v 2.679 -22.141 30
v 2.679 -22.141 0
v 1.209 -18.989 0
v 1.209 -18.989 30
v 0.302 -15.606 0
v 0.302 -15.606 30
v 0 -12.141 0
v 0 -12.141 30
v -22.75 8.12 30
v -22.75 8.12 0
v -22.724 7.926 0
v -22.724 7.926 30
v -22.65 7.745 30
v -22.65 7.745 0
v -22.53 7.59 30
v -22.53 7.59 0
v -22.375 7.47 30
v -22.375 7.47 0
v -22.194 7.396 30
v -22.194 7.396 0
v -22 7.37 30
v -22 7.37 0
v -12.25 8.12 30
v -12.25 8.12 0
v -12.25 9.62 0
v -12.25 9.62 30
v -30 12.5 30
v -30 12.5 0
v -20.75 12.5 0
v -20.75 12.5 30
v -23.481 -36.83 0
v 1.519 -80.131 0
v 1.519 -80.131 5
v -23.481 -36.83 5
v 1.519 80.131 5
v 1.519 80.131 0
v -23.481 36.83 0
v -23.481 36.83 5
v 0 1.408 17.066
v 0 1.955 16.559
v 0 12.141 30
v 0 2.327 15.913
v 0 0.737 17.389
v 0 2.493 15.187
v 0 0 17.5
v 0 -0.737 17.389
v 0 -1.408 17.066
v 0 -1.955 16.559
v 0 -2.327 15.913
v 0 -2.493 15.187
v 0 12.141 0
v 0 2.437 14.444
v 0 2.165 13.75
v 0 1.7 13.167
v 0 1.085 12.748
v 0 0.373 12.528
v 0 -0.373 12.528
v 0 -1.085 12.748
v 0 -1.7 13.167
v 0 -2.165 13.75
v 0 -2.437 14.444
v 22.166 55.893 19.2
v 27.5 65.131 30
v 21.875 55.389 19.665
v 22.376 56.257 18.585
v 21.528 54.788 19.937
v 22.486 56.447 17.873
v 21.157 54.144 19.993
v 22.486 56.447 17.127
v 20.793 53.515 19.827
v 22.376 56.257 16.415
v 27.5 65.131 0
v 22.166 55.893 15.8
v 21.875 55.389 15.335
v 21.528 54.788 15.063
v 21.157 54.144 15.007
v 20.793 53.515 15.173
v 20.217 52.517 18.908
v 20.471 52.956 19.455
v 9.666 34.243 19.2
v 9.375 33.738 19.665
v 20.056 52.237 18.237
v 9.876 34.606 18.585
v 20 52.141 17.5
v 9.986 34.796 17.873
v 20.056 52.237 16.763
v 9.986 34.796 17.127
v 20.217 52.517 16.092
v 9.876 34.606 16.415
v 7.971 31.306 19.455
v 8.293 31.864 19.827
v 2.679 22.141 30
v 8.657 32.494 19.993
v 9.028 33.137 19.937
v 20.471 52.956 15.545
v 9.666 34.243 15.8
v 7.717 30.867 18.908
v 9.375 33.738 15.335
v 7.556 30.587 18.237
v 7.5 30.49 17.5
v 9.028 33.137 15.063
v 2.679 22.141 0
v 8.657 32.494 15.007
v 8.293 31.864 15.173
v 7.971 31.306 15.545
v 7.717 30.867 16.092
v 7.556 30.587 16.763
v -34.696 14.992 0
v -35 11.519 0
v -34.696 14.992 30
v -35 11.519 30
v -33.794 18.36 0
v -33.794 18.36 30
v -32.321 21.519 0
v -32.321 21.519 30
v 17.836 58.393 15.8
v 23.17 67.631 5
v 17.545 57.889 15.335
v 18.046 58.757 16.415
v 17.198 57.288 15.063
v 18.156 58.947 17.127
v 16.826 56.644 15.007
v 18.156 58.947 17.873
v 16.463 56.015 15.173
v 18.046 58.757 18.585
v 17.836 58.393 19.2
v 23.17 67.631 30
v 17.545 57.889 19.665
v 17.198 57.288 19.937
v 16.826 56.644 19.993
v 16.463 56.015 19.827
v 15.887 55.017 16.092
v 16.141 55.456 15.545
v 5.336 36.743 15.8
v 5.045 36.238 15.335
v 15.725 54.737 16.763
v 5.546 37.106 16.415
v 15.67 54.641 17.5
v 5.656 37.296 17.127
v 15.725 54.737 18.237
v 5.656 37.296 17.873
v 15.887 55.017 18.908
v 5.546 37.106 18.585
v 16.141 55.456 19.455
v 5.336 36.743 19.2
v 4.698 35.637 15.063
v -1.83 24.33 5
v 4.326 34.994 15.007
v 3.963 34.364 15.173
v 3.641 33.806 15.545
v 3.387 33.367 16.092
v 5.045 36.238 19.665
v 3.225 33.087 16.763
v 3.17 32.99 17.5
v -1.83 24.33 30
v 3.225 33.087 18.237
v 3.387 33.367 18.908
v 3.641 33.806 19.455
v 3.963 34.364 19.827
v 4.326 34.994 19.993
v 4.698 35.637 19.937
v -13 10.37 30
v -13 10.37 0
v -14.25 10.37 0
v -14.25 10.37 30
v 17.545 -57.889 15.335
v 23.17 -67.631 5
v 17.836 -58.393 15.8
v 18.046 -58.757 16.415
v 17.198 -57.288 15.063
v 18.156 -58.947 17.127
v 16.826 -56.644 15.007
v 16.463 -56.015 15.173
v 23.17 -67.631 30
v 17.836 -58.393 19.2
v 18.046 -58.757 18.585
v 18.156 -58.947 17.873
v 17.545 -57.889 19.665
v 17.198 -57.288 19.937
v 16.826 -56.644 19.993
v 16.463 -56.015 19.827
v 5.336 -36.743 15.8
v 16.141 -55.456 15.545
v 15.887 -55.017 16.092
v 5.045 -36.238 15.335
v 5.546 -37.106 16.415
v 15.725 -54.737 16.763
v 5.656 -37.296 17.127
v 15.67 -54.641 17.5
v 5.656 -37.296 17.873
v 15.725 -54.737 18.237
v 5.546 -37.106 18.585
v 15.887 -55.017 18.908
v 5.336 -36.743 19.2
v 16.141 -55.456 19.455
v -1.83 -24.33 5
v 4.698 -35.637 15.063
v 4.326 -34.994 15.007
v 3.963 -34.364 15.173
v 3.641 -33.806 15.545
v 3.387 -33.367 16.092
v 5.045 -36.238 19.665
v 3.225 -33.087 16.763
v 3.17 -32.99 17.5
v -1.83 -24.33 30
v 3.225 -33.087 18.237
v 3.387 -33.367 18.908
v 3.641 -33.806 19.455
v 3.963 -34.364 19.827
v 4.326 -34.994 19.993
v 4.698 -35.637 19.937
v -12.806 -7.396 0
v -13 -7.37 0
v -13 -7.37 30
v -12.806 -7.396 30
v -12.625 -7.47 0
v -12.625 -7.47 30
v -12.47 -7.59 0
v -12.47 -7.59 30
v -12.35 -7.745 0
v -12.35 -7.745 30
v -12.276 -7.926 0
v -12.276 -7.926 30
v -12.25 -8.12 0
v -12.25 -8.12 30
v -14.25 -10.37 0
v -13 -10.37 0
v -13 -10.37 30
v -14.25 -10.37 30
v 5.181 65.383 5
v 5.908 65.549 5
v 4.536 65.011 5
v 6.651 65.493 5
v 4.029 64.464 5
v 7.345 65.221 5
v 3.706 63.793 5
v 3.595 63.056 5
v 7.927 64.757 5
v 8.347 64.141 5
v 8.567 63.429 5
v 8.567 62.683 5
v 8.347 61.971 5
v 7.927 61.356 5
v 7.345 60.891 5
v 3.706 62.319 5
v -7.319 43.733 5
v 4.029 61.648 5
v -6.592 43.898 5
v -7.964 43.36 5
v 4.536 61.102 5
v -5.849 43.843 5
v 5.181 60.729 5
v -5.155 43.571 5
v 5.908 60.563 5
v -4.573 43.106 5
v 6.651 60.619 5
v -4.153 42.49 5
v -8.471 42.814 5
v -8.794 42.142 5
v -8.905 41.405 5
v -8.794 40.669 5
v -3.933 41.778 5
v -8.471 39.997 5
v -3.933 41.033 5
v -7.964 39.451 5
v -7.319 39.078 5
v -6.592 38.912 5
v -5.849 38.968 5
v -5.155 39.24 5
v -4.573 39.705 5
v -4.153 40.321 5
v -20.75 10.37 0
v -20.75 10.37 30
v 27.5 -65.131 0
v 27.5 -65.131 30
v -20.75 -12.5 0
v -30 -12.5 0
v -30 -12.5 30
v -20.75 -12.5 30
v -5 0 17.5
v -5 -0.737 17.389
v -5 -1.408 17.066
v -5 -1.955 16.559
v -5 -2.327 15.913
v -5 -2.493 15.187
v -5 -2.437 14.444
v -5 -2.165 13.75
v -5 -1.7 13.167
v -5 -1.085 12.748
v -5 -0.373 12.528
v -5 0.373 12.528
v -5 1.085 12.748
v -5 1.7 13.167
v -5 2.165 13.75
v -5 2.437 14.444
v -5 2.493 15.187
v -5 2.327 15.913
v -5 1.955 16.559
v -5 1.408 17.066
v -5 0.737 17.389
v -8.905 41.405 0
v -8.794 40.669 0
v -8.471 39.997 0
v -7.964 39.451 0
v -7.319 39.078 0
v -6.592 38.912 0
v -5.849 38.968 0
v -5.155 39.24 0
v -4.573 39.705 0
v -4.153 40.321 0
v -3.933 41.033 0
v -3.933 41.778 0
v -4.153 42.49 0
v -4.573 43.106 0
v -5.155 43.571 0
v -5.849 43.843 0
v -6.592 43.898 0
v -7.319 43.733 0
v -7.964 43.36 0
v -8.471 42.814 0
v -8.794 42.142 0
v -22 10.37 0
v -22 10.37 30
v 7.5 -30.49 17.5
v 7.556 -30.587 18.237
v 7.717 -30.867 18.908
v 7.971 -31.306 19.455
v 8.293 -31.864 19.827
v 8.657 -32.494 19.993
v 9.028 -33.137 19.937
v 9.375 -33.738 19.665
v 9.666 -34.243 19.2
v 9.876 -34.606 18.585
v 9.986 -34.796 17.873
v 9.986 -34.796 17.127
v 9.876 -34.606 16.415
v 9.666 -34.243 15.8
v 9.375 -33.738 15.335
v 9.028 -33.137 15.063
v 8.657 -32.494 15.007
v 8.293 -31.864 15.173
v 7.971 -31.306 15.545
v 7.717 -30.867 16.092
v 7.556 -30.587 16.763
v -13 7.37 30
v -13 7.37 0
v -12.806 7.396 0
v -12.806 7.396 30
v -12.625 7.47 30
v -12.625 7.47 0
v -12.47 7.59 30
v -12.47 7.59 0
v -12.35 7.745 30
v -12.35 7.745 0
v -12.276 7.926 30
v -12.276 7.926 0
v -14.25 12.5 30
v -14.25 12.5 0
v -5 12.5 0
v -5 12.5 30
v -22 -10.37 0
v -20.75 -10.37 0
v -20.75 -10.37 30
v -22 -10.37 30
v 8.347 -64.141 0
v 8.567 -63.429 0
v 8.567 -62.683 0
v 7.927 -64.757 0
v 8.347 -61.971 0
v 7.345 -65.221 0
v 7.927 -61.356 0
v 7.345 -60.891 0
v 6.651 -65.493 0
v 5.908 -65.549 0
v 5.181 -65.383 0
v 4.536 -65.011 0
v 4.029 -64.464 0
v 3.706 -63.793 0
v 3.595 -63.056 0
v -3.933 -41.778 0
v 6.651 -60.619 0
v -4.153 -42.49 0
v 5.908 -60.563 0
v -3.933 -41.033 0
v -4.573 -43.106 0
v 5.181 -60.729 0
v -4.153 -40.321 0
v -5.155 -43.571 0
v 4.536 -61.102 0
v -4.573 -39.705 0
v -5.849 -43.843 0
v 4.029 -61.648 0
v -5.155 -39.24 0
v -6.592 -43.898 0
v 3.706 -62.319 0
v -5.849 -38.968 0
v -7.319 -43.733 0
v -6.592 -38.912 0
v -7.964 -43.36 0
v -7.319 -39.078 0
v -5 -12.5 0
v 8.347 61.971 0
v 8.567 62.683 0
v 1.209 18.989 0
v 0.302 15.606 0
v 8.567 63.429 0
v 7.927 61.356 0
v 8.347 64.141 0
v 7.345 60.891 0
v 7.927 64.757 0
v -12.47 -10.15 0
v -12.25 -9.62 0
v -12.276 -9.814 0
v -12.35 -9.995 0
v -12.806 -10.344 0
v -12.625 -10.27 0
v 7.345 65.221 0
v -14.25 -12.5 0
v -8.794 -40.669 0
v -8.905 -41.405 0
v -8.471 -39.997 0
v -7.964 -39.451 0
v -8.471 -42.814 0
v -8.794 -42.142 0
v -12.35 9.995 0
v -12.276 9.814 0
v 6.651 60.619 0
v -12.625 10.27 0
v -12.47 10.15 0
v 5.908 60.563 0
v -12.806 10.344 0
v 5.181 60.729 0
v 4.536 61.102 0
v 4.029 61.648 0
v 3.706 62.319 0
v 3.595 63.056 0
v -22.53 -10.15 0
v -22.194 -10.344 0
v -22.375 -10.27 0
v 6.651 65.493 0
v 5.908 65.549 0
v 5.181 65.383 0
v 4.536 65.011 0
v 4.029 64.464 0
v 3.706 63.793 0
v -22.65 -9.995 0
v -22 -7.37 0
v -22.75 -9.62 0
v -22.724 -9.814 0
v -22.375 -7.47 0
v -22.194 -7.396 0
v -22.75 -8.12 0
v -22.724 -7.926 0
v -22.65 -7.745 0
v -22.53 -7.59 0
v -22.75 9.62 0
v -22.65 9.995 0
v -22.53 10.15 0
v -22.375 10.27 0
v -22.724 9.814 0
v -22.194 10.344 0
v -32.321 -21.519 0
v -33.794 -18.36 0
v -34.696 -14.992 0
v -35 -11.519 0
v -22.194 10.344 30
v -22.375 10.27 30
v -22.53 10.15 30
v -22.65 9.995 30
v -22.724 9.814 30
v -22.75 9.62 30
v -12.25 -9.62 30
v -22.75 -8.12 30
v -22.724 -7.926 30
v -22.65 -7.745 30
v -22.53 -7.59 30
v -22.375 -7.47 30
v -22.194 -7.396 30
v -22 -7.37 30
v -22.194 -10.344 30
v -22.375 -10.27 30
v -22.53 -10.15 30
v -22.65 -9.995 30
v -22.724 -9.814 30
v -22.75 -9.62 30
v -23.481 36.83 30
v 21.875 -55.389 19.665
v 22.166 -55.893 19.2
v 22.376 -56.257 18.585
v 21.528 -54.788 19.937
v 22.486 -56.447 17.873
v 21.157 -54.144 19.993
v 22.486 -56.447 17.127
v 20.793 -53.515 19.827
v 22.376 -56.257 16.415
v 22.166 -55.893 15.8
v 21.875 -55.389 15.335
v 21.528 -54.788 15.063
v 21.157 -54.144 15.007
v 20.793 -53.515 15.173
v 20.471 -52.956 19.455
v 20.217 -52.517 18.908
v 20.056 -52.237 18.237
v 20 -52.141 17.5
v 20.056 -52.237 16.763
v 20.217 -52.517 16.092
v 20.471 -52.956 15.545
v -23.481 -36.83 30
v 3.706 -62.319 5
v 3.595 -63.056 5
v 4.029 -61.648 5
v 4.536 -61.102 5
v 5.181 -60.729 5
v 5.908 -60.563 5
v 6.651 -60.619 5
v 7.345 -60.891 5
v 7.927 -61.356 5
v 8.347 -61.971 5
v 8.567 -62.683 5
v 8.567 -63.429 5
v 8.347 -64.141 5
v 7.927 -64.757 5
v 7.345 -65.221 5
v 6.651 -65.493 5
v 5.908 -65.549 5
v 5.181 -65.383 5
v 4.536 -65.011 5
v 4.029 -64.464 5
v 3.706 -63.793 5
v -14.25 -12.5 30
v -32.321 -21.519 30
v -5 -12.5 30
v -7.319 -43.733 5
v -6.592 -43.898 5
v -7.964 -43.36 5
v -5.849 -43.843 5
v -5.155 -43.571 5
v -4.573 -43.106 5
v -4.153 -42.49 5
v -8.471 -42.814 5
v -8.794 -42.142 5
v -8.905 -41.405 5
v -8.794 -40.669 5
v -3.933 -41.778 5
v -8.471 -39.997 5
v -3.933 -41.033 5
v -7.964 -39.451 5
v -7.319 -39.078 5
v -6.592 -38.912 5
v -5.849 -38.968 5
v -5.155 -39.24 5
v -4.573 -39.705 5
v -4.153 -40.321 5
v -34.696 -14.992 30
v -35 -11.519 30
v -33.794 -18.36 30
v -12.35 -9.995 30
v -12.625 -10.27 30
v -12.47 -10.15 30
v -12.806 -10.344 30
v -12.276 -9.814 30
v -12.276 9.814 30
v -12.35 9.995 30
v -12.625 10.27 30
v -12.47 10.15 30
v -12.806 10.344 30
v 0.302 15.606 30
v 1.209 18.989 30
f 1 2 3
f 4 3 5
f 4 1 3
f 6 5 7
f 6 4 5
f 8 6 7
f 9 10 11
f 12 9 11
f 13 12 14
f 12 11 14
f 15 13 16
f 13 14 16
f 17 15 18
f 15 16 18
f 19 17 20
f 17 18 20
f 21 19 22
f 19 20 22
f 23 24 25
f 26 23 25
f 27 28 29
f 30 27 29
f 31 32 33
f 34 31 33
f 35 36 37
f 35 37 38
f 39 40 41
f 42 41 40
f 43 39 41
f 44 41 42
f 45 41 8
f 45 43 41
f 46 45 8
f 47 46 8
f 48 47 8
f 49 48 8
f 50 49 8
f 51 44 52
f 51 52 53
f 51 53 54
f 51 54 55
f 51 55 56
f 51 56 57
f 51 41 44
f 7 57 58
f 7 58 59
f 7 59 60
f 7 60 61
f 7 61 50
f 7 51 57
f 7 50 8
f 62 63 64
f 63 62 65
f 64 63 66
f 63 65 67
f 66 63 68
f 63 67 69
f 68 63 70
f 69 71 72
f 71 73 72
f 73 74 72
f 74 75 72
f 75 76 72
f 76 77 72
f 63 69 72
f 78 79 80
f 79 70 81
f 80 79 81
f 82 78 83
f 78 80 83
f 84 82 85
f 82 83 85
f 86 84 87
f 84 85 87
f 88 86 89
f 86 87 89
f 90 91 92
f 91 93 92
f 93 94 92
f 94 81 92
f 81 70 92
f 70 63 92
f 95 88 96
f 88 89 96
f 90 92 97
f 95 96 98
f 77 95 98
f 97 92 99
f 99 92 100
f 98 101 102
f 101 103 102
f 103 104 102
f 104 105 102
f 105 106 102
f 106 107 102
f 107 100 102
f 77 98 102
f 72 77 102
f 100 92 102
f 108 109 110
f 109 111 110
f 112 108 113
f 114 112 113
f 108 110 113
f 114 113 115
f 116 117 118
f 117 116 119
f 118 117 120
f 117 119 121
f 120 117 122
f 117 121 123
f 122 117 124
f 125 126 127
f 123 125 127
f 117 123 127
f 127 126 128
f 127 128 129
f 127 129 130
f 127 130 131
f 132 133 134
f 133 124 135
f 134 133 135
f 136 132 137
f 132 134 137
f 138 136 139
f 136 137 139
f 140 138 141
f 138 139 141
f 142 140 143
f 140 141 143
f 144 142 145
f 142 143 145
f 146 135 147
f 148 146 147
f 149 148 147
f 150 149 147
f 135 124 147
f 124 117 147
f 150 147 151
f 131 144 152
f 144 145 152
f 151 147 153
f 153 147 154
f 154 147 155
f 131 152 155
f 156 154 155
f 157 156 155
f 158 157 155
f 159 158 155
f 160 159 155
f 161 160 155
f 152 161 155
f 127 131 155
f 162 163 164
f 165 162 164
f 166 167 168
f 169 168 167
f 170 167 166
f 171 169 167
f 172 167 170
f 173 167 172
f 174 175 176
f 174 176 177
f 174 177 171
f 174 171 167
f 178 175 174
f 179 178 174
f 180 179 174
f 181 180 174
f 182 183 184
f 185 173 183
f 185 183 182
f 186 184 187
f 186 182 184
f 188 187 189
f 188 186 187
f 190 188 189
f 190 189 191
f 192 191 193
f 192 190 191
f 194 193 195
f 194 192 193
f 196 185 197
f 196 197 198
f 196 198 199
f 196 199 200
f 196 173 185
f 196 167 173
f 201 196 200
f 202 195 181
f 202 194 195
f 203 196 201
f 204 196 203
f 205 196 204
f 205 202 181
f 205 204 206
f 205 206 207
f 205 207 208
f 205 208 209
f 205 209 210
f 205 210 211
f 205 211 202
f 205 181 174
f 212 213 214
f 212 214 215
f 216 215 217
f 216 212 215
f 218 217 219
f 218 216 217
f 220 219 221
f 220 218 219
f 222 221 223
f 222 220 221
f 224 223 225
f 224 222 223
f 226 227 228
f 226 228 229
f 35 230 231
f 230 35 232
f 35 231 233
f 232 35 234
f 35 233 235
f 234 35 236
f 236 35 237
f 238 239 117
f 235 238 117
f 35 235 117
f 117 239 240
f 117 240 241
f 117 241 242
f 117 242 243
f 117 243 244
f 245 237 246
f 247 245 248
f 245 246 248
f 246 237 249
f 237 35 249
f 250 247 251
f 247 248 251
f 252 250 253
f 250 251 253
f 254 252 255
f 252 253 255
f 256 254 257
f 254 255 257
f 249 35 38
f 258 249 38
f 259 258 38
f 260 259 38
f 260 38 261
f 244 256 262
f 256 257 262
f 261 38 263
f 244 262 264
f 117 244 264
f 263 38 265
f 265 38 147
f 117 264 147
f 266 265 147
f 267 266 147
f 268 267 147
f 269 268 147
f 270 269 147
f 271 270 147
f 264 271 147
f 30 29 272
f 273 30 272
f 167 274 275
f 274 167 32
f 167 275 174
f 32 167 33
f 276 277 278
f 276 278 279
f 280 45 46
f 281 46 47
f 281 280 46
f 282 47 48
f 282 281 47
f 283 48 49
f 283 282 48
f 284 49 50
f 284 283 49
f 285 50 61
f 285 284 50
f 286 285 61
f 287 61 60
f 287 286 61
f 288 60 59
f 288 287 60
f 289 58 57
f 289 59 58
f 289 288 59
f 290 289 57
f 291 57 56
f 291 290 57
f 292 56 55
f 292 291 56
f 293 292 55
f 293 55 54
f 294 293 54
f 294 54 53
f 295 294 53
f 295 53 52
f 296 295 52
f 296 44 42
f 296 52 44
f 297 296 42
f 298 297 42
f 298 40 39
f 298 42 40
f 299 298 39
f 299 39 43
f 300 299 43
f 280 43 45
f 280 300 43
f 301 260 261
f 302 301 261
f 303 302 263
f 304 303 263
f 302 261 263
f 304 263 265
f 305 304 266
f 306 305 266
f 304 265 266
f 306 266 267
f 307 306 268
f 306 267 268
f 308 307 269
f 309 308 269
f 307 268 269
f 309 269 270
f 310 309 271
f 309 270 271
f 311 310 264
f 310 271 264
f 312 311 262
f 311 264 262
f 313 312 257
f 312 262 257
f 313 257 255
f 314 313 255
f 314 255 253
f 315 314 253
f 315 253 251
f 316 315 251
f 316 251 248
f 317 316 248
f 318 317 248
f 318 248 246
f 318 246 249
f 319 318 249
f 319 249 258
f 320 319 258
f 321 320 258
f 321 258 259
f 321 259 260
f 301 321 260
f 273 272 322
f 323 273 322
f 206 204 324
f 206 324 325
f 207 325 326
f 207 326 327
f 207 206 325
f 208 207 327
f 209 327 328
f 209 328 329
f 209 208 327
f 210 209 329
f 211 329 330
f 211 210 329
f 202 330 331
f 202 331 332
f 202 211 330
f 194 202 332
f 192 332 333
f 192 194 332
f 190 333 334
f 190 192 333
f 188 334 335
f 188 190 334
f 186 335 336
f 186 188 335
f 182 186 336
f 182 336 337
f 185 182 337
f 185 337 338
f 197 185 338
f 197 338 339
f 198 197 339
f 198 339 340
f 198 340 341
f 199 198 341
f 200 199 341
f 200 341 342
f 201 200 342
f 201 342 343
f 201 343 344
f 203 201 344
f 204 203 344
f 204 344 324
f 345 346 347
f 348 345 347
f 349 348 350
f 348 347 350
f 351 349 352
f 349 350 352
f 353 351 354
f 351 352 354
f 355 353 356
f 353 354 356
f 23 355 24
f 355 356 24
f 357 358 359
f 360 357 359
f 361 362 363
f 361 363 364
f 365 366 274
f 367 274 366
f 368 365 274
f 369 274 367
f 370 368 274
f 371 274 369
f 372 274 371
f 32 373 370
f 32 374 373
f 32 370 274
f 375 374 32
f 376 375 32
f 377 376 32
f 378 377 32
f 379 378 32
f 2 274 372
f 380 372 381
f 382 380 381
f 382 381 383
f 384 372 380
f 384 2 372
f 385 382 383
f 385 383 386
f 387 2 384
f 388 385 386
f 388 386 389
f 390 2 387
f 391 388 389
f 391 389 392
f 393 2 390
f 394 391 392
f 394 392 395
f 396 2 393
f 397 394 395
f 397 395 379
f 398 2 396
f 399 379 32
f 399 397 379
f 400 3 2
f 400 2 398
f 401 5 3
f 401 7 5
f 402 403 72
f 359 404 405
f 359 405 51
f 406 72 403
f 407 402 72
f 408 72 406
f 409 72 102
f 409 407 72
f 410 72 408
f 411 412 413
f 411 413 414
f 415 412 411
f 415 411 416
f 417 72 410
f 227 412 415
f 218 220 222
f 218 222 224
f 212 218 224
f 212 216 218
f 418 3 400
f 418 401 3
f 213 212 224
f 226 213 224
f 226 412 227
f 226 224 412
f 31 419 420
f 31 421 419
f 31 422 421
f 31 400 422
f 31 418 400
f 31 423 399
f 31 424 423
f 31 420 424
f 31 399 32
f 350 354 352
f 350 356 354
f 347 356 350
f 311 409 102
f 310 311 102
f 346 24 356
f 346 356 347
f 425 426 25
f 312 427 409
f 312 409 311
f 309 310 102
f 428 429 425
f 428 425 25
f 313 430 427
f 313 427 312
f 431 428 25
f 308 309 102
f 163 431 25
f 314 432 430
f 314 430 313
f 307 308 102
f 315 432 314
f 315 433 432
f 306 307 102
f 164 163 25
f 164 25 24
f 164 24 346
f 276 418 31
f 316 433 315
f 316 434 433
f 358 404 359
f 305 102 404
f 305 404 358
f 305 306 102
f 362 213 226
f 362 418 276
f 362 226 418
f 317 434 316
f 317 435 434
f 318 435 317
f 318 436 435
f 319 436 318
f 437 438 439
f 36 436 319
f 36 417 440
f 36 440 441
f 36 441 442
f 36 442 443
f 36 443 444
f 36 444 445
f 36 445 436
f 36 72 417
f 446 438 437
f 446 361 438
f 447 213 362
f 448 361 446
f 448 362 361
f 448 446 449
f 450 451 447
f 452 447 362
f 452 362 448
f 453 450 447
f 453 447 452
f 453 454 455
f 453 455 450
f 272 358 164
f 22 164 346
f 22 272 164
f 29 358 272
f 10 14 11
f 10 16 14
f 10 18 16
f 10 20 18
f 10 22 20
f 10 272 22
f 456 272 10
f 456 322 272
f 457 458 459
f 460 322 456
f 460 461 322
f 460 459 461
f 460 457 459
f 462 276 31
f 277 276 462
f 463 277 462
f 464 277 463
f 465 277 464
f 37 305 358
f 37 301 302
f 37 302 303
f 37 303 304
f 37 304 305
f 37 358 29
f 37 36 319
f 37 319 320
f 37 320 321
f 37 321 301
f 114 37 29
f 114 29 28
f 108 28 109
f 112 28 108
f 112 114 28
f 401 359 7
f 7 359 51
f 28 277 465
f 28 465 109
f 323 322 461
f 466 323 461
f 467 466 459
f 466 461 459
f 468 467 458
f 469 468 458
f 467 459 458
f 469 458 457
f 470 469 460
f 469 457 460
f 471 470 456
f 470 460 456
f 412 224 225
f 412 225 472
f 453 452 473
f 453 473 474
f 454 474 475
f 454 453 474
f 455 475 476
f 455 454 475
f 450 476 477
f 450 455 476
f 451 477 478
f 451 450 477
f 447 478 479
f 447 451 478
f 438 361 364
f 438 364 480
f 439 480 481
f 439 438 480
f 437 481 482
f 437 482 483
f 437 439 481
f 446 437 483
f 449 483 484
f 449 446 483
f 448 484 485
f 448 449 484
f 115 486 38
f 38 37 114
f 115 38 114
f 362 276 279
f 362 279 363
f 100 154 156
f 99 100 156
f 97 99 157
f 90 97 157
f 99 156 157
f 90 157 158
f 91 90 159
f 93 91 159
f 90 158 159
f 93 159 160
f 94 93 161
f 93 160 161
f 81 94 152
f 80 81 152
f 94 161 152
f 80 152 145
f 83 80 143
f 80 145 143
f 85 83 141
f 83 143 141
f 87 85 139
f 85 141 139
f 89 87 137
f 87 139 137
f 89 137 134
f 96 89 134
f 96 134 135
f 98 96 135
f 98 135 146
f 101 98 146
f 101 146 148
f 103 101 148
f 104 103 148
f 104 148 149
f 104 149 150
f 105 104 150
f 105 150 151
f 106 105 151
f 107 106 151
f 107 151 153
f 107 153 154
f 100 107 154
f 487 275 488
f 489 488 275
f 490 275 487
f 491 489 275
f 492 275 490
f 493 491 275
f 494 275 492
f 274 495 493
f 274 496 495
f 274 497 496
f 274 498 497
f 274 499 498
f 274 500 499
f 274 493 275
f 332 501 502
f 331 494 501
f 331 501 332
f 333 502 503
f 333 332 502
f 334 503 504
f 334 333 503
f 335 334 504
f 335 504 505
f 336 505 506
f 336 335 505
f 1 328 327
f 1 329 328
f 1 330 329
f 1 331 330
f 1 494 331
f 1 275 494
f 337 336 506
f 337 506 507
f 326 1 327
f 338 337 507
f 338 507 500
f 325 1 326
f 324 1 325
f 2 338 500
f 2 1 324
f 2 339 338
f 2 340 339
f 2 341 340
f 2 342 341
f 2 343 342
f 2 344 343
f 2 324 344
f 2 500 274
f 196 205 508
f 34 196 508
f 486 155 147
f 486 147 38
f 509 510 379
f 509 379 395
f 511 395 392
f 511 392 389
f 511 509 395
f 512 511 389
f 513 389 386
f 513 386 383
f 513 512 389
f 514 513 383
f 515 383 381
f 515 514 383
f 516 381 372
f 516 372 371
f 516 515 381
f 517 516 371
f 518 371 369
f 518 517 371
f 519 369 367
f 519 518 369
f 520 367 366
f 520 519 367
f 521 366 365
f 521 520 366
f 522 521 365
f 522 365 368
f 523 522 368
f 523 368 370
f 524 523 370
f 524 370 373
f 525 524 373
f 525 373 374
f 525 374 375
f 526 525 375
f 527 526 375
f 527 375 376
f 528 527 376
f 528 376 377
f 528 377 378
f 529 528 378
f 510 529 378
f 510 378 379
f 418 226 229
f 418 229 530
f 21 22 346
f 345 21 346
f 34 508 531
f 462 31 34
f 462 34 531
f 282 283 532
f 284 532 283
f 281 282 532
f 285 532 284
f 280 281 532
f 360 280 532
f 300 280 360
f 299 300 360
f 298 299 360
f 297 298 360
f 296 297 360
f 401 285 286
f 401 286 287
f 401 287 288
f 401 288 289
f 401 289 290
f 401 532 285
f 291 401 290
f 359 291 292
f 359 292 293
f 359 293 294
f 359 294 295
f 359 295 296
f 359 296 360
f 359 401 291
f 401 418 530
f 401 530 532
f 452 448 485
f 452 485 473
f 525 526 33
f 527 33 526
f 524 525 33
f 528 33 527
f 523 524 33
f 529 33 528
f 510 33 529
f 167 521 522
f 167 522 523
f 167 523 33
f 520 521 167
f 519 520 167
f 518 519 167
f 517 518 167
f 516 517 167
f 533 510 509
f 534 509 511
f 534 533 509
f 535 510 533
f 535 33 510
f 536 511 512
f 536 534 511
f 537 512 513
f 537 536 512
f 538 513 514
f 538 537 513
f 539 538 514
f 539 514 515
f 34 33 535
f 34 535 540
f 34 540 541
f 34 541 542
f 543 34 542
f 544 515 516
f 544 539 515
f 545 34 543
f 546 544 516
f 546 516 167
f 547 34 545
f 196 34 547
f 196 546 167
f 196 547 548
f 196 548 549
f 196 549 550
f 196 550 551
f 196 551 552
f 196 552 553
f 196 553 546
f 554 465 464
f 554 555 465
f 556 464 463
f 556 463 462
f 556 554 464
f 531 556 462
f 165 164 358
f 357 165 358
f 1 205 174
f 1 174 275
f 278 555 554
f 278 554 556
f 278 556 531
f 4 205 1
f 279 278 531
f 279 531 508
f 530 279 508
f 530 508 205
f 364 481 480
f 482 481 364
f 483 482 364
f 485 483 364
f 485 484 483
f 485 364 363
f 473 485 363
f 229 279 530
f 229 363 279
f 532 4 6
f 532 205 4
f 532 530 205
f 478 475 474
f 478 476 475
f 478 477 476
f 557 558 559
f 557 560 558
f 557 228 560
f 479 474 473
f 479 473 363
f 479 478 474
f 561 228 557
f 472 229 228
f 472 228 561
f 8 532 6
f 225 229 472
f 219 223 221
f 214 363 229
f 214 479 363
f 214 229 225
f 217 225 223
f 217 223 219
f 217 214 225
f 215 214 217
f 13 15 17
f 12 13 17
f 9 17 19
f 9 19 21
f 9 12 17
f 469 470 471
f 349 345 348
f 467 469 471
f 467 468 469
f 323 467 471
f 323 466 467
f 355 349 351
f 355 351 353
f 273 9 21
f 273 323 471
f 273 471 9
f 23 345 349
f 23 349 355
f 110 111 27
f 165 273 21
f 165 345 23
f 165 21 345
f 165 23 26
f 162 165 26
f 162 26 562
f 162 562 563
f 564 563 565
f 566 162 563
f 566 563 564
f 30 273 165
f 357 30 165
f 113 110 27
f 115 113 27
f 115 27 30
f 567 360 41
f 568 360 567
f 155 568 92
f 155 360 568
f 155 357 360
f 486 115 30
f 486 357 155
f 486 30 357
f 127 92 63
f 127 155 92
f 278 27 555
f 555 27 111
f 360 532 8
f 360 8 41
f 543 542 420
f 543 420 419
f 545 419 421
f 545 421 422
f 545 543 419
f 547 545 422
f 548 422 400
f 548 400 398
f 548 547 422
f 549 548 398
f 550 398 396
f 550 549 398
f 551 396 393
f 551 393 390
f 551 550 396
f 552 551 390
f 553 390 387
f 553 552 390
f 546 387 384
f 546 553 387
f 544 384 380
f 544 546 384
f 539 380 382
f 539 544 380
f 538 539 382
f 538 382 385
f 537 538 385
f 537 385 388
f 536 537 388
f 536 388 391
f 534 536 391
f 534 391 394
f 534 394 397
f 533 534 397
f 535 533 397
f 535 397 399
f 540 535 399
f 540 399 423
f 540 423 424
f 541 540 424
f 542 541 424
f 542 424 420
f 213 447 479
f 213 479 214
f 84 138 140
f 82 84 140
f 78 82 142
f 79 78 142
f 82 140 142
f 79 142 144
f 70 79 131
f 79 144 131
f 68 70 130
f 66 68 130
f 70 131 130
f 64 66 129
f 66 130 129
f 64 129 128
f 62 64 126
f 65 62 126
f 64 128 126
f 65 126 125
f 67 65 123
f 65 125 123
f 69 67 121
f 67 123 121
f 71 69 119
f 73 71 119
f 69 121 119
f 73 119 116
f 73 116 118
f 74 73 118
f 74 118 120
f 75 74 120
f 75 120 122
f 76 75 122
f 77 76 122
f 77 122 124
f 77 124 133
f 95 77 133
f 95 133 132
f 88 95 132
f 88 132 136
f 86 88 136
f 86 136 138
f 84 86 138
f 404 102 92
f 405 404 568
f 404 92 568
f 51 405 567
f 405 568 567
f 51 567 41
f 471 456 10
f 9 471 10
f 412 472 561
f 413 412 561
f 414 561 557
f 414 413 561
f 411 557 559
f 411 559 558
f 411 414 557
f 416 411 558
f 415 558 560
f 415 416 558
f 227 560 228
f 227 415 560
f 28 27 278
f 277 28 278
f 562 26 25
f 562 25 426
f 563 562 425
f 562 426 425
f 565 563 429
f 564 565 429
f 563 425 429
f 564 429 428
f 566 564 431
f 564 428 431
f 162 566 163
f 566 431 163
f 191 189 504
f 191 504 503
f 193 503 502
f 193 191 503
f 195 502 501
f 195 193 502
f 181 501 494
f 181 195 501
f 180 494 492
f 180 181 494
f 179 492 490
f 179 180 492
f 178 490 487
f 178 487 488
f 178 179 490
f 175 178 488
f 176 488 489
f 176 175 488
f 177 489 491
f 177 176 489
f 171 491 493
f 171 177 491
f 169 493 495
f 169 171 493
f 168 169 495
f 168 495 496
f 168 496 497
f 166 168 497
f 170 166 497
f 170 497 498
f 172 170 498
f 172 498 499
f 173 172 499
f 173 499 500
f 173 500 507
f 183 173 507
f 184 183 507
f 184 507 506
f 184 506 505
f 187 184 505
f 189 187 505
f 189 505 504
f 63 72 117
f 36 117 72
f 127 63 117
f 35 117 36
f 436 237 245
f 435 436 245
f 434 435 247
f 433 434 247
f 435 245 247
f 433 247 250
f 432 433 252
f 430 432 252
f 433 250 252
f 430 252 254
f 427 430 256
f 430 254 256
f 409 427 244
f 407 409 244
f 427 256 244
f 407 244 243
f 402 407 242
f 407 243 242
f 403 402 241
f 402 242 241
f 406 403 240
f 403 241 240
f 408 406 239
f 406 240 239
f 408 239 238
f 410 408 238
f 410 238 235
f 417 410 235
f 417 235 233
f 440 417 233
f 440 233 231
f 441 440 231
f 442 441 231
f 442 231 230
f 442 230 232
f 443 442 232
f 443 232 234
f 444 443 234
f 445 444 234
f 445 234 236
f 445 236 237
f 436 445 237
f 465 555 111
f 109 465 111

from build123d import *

# Parameters (mm, degrees)
F1_DEPTH       = 30
F3_DEPTH       = 50
F7_D           = 5
F7_DEPTH       = 12.7
F7_TIP         = 1.5021515476
F7_ON_F4_D     = 5
F7_ON_F4_DEPTH = 12.7
F7_ON_F4_TIP   = 1.5021515476
F7_ON_F6_D     = 5
F7_ON_F6_DEPTH = 12.7
F7_ON_F6_TIP   = 1.5021515476
F8_R           = 20


with BuildPart() as f1:
    # F0 (on Top) → F1 (new body)
    with BuildSketch(Plane.XY):
        with BuildLine():
            Line((-35, 16.8782217351), (-35, 0))
            Line((-35, 0), (-30, 0))
            Line((-30, 0), (-30, 12.5))
            Line((-30, 12.5), (-20.75, 12.5))
            Line((-20.75, 12.5), (-20.75, 10.37))
            Line((-20.75, 10.37), (-22, 10.37))
            ThreePointArc((-22, 10.37), (-22.5303300859, 10.1503300859), (-22.75, 9.62))
            Line((-22.75, 9.62), (-22.75, 8.12))
            ThreePointArc((-22.75, 8.12), (-22.5303300859, 7.5896699141), (-22, 7.37))
            Line((-22, 7.37), (-13, 7.37))
            ThreePointArc((-13, 7.37), (-12.4696699141, 7.5896699141), (-12.25, 8.12))
            Line((-12.25, 8.12), (-12.25, 9.62))
            ThreePointArc((-12.25, 9.62), (-12.4696699141, 10.1503300859), (-13, 10.37))
            Line((-13, 10.37), (-14.25, 10.37))
            Line((-14.25, 10.37), (-14.25, 12.5))
            Line((-14.25, 12.5), (-5, 12.5))
            Line((-5, 12.5), (-5, 0))
            Line((-5, 0), (0, 0))
            Line((0, 0), (0, 17.5))
            Line((0, 17.5), (2.5, 21.8301270189))
            Line((2.5, 21.8301270189), (-23.4807621135, 36.8301270189))
            Line((-23.4807621135, 36.8301270189), (-35, 16.8782217351))
        make_face()
    extrude(amount=F1_DEPTH)

    # F2 (on face) → F3 (join)
    with BuildSketch(Plane(origin=(10.0777222831, 17.4551270189, 0), x_dir=(-0.8660254038, 0.5, 0), z_dir=(0.5, 0.8660254038, 0))):
        Polygon((13.75, 30), (8.75, 30), (8.75, 0), (38.75, 0), (38.75, 5), (13.75, 5), align=None)
    extrude(amount=F3_DEPTH)

    # F7
    with Locations(Plane.YZ):
        with Locations((0, 15)):
            Hole(F7_D / 2, depth=F7_DEPTH)
            with Locations((0, 0, -(F7_DEPTH + F7_TIP / 2))):  # 118° drill point
                Cone(0, F7_D / 2, F7_TIP, mode=Mode.SUBTRACT)

    # F7 on F4
    with Locations(Plane(origin=(0, 0, 0), x_dir=(1, 0, 0), z_dir=(0, 0, -1))):
        with Locations((-6.4054445662, -41.4054445662), (6.0945554338, -63.0560796608)):
            Hole(F7_ON_F4_D / 2, depth=F7_ON_F4_DEPTH)
            with Locations((0, 0, -(F7_ON_F4_DEPTH + F7_ON_F4_TIP / 2))):  # 118° drill point
                Cone(0, F7_ON_F4_D / 2, F7_ON_F4_TIP, mode=Mode.SUBTRACT)

    # F7 on F6
    with Locations(Plane(origin=(-7.5777222831, 4.375, 0), x_dir=(0.5, 0.8660254038, 0), z_dir=(0.8660254038, -0.5, 0))):
        with Locations((32.6554445662, 17.5), (57.6554445662, 17.5)):
            Hole(F7_ON_F6_D / 2, depth=F7_ON_F6_DEPTH)
            with Locations((0, 0, -(F7_ON_F6_DEPTH + F7_ON_F6_TIP / 2))):  # 118° drill point
                Cone(0, F7_ON_F6_D / 2, F7_ON_F6_TIP, mode=Mode.SUBTRACT)

    # F8
    f8_edges = [f1.edges().sort_by_distance(p)[0] for p in [
        (-35, 16.878222, 15),
        (0, 17.5, 15),
    ]]
    fillet(f8_edges, radius=F8_R)

    # F9: F1 across plane


with BuildPart() as f1_1:
    add(f1.part)
    add(f1.part.mirror(Plane.XZ))


solid = f1_1.part
